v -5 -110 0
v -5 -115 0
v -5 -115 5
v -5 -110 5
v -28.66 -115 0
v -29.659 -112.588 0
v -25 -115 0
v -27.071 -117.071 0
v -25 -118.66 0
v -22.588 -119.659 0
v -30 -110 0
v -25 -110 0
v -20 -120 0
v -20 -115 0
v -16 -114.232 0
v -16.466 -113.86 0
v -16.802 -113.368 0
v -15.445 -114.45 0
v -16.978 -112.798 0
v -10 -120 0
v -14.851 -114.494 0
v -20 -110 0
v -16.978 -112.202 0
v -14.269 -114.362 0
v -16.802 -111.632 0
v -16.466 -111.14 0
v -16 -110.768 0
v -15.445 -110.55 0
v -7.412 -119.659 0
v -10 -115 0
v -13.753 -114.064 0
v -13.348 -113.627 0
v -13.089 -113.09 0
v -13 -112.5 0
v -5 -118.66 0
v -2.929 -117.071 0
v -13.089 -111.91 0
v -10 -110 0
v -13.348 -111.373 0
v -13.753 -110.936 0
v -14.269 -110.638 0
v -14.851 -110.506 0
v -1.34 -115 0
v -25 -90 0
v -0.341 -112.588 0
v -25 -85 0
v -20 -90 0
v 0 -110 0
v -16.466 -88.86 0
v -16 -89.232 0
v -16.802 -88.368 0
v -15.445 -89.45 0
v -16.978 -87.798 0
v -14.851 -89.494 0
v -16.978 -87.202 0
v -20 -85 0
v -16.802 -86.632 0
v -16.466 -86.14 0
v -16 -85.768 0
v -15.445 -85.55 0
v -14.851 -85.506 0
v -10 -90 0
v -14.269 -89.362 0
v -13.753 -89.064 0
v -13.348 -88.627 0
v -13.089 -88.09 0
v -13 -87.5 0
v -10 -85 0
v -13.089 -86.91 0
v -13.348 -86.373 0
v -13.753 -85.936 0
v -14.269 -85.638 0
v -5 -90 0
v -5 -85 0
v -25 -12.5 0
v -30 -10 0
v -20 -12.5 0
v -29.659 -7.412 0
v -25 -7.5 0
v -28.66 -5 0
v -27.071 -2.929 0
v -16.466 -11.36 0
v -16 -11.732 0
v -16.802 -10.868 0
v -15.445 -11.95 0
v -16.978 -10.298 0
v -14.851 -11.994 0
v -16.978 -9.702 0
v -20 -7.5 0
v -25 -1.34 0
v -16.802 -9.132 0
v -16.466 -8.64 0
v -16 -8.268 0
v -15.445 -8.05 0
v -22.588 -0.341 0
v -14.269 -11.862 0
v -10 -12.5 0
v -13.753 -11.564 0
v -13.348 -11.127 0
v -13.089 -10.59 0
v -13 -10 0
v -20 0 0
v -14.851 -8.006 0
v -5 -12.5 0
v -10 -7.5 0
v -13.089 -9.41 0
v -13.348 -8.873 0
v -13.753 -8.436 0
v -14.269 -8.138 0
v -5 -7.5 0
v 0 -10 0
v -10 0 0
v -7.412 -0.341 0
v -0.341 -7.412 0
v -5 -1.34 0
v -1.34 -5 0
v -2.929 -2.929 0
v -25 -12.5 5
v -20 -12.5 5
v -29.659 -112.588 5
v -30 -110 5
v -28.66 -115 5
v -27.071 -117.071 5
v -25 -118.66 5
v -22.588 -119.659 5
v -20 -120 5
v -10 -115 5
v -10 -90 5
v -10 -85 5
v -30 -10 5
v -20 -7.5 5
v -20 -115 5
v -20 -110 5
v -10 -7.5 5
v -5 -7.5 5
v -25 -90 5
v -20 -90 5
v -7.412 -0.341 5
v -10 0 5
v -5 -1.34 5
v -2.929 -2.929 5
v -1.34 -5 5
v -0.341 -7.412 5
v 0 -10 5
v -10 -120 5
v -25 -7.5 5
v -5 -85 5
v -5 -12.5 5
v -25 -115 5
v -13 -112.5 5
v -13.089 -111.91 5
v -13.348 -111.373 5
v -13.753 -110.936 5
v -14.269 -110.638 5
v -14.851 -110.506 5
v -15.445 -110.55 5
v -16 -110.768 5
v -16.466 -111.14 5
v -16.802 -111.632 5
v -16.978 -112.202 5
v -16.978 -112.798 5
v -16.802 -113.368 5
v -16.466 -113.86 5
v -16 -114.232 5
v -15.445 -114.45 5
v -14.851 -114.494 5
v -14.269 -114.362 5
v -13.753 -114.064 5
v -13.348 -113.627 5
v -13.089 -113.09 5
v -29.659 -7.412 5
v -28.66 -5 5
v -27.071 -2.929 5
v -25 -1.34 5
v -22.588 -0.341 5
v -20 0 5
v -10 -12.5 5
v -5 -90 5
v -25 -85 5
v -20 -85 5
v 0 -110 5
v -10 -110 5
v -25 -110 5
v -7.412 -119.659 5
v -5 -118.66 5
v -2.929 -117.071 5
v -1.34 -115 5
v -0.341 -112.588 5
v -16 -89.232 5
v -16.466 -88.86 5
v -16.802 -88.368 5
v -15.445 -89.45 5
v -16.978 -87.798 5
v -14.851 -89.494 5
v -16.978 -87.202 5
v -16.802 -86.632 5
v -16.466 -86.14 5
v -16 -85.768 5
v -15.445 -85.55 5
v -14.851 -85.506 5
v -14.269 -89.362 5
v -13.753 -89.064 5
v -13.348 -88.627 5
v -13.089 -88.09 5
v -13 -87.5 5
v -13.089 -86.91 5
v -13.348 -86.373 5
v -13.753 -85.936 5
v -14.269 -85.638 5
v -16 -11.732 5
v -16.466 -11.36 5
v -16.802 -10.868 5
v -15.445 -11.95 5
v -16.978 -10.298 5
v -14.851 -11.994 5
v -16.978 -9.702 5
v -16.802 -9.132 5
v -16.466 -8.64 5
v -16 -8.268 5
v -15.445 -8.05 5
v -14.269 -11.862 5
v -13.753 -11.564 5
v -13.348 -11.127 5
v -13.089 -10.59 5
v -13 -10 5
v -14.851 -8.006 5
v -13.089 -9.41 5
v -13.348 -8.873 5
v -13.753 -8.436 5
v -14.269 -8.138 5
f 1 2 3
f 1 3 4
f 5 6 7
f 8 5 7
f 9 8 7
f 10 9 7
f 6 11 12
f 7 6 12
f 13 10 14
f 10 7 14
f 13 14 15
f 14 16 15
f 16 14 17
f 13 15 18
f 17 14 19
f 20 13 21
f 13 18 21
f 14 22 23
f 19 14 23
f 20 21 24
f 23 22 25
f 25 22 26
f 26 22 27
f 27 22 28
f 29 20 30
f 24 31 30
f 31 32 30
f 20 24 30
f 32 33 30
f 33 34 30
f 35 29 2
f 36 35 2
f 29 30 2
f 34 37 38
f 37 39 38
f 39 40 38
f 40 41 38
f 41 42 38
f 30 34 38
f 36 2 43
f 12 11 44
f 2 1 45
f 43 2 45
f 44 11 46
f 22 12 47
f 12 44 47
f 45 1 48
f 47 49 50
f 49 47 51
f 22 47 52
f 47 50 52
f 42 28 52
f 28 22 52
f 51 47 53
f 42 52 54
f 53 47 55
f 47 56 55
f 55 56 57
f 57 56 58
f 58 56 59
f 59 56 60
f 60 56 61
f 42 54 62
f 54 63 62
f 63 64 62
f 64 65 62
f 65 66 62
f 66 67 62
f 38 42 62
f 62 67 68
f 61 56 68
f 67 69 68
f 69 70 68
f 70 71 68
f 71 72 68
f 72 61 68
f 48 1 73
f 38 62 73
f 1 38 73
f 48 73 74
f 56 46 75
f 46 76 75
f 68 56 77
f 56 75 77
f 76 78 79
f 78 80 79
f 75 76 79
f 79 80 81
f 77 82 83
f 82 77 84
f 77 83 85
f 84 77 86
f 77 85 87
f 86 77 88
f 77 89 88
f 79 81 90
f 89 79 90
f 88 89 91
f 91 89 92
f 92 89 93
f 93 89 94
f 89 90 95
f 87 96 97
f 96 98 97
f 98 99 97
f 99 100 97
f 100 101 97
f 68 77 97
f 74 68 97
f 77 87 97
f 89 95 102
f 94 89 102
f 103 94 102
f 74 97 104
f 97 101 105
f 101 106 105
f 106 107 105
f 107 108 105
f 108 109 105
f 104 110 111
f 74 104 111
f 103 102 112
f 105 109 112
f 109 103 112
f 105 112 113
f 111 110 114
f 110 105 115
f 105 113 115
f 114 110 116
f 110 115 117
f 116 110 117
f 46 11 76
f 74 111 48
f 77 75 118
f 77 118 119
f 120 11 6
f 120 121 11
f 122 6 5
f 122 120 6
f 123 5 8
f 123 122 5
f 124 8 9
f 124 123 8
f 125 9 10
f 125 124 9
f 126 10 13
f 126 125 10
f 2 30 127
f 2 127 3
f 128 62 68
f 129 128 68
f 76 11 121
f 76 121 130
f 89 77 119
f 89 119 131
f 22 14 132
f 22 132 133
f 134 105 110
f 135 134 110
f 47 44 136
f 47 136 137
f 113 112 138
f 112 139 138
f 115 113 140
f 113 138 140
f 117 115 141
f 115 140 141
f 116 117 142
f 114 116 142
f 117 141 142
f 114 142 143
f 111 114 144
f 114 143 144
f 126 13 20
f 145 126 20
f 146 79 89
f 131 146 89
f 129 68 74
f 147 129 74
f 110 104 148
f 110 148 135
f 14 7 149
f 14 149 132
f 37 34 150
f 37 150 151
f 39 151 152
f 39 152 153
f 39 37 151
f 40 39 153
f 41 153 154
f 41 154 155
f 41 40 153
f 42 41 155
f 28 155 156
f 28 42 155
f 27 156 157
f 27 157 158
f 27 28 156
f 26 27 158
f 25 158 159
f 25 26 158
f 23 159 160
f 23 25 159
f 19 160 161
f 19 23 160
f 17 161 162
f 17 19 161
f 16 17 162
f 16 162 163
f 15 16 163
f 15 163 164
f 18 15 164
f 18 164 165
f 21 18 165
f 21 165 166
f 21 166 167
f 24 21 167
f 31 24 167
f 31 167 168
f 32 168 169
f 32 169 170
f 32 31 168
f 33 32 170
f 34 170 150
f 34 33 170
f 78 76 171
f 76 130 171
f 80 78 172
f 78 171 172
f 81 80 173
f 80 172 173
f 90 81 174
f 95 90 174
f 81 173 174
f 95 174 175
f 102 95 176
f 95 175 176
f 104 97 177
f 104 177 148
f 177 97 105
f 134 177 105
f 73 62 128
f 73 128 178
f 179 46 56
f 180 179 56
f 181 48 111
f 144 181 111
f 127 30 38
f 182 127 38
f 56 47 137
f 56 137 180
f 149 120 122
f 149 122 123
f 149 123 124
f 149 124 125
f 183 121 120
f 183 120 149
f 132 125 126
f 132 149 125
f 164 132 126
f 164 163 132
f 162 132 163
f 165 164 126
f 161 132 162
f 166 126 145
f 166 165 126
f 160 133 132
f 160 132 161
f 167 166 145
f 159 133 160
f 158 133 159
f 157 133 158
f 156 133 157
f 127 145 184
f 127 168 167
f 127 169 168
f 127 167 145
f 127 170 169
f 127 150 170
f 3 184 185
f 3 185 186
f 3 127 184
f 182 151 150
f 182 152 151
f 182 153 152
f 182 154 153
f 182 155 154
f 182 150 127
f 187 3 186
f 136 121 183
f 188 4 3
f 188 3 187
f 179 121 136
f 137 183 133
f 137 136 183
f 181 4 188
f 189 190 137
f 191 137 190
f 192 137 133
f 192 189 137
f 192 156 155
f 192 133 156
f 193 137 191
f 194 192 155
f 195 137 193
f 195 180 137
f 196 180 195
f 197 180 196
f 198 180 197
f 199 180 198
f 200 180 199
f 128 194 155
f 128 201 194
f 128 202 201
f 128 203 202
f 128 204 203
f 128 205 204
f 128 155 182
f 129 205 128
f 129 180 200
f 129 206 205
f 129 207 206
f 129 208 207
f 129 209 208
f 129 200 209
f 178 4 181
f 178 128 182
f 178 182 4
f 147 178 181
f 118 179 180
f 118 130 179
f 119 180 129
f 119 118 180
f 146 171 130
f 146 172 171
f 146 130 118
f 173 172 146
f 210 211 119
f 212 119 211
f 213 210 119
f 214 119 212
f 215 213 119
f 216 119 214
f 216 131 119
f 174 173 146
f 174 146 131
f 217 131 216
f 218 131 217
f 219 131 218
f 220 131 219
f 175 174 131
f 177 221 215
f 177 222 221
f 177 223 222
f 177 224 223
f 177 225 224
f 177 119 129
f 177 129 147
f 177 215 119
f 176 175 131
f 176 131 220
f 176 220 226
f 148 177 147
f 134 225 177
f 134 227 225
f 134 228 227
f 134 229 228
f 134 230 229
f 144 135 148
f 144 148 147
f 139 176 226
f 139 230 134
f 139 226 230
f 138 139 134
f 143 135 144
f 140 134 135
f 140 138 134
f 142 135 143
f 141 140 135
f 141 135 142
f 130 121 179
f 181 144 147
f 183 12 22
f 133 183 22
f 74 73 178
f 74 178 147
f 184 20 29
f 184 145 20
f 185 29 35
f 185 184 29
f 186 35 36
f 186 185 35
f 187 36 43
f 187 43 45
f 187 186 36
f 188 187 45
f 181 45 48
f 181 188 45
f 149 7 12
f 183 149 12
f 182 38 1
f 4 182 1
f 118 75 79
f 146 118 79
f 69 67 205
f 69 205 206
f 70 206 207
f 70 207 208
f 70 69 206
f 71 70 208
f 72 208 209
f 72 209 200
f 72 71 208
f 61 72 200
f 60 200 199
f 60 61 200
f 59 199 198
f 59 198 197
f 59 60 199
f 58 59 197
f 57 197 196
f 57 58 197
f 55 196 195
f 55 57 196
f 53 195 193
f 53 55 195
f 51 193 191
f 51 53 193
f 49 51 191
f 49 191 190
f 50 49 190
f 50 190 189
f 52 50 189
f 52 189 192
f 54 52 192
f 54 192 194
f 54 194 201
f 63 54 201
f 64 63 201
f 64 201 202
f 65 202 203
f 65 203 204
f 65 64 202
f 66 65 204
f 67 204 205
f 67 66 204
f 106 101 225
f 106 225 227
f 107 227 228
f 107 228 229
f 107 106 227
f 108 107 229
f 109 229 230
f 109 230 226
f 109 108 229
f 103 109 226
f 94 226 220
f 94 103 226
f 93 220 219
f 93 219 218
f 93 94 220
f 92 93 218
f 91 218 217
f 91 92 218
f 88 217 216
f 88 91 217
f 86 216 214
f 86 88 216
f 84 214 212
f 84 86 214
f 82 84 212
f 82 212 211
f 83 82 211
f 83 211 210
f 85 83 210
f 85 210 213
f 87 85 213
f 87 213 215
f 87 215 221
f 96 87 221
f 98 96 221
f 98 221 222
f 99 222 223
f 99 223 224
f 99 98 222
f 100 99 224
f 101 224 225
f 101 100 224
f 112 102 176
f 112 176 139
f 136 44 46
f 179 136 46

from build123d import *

# Parameters (mm, degrees)
ESQUISSE1_W        = 30
ESQUISSE1_H        = 120
ESQUISSE1_R        = 2
ESQUISSE1_W_2      = 5
ESQUISSE1_H_2      = 5
BOSS_EXTRU_1_DEPTH = 5
CONG_1_R           = 10


with BuildPart() as part:
    # Esquisse1 → Boss.-Extru.1 (new body)
    with BuildSketch(Plane.XY):
        with Locations((-15, -60)):
            Rectangle(ESQUISSE1_W, ESQUISSE1_H)
        with Locations((-15, -10)):
            Circle(ESQUISSE1_R, mode=Mode.SUBTRACT)
        with Locations((-15, -87.5)):
            Circle(ESQUISSE1_R, mode=Mode.SUBTRACT)
        with Locations((-15, -112.5)):
            Circle(ESQUISSE1_R, mode=Mode.SUBTRACT)
        with Locations((-22.5, -10)):
            Rectangle(ESQUISSE1_W_2, ESQUISSE1_H_2, mode=Mode.SUBTRACT)
        with Locations((-7.5, -112.5)):
            Rectangle(ESQUISSE1_W_2, ESQUISSE1_H_2, mode=Mode.SUBTRACT)
        with Locations((-22.5, -112.5)):
            Rectangle(ESQUISSE1_W_2, ESQUISSE1_H_2, mode=Mode.SUBTRACT)
        with Locations((-22.5, -87.5)):
            Rectangle(ESQUISSE1_W_2, ESQUISSE1_H_2, mode=Mode.SUBTRACT)
        with Locations((-7.5, -87.5)):
            Rectangle(ESQUISSE1_W_2, ESQUISSE1_H_2, mode=Mode.SUBTRACT)
        with Locations((-7.5, -10)):
            Rectangle(ESQUISSE1_W_2, ESQUISSE1_H_2, mode=Mode.SUBTRACT)
    extrude(amount=BOSS_EXTRU_1_DEPTH)

    # Congé1
    cong_1_edges = [part.edges().sort_by_distance(p)[0] for p in [
        (-30, 0, 2.5),
        (0, 0, 2.5),
        (0, -120, 2.5),
        (-30, -120, 2.5),
    ]]
    fillet(cong_1_edges, radius=CONG_1_R)


solid = part.part
